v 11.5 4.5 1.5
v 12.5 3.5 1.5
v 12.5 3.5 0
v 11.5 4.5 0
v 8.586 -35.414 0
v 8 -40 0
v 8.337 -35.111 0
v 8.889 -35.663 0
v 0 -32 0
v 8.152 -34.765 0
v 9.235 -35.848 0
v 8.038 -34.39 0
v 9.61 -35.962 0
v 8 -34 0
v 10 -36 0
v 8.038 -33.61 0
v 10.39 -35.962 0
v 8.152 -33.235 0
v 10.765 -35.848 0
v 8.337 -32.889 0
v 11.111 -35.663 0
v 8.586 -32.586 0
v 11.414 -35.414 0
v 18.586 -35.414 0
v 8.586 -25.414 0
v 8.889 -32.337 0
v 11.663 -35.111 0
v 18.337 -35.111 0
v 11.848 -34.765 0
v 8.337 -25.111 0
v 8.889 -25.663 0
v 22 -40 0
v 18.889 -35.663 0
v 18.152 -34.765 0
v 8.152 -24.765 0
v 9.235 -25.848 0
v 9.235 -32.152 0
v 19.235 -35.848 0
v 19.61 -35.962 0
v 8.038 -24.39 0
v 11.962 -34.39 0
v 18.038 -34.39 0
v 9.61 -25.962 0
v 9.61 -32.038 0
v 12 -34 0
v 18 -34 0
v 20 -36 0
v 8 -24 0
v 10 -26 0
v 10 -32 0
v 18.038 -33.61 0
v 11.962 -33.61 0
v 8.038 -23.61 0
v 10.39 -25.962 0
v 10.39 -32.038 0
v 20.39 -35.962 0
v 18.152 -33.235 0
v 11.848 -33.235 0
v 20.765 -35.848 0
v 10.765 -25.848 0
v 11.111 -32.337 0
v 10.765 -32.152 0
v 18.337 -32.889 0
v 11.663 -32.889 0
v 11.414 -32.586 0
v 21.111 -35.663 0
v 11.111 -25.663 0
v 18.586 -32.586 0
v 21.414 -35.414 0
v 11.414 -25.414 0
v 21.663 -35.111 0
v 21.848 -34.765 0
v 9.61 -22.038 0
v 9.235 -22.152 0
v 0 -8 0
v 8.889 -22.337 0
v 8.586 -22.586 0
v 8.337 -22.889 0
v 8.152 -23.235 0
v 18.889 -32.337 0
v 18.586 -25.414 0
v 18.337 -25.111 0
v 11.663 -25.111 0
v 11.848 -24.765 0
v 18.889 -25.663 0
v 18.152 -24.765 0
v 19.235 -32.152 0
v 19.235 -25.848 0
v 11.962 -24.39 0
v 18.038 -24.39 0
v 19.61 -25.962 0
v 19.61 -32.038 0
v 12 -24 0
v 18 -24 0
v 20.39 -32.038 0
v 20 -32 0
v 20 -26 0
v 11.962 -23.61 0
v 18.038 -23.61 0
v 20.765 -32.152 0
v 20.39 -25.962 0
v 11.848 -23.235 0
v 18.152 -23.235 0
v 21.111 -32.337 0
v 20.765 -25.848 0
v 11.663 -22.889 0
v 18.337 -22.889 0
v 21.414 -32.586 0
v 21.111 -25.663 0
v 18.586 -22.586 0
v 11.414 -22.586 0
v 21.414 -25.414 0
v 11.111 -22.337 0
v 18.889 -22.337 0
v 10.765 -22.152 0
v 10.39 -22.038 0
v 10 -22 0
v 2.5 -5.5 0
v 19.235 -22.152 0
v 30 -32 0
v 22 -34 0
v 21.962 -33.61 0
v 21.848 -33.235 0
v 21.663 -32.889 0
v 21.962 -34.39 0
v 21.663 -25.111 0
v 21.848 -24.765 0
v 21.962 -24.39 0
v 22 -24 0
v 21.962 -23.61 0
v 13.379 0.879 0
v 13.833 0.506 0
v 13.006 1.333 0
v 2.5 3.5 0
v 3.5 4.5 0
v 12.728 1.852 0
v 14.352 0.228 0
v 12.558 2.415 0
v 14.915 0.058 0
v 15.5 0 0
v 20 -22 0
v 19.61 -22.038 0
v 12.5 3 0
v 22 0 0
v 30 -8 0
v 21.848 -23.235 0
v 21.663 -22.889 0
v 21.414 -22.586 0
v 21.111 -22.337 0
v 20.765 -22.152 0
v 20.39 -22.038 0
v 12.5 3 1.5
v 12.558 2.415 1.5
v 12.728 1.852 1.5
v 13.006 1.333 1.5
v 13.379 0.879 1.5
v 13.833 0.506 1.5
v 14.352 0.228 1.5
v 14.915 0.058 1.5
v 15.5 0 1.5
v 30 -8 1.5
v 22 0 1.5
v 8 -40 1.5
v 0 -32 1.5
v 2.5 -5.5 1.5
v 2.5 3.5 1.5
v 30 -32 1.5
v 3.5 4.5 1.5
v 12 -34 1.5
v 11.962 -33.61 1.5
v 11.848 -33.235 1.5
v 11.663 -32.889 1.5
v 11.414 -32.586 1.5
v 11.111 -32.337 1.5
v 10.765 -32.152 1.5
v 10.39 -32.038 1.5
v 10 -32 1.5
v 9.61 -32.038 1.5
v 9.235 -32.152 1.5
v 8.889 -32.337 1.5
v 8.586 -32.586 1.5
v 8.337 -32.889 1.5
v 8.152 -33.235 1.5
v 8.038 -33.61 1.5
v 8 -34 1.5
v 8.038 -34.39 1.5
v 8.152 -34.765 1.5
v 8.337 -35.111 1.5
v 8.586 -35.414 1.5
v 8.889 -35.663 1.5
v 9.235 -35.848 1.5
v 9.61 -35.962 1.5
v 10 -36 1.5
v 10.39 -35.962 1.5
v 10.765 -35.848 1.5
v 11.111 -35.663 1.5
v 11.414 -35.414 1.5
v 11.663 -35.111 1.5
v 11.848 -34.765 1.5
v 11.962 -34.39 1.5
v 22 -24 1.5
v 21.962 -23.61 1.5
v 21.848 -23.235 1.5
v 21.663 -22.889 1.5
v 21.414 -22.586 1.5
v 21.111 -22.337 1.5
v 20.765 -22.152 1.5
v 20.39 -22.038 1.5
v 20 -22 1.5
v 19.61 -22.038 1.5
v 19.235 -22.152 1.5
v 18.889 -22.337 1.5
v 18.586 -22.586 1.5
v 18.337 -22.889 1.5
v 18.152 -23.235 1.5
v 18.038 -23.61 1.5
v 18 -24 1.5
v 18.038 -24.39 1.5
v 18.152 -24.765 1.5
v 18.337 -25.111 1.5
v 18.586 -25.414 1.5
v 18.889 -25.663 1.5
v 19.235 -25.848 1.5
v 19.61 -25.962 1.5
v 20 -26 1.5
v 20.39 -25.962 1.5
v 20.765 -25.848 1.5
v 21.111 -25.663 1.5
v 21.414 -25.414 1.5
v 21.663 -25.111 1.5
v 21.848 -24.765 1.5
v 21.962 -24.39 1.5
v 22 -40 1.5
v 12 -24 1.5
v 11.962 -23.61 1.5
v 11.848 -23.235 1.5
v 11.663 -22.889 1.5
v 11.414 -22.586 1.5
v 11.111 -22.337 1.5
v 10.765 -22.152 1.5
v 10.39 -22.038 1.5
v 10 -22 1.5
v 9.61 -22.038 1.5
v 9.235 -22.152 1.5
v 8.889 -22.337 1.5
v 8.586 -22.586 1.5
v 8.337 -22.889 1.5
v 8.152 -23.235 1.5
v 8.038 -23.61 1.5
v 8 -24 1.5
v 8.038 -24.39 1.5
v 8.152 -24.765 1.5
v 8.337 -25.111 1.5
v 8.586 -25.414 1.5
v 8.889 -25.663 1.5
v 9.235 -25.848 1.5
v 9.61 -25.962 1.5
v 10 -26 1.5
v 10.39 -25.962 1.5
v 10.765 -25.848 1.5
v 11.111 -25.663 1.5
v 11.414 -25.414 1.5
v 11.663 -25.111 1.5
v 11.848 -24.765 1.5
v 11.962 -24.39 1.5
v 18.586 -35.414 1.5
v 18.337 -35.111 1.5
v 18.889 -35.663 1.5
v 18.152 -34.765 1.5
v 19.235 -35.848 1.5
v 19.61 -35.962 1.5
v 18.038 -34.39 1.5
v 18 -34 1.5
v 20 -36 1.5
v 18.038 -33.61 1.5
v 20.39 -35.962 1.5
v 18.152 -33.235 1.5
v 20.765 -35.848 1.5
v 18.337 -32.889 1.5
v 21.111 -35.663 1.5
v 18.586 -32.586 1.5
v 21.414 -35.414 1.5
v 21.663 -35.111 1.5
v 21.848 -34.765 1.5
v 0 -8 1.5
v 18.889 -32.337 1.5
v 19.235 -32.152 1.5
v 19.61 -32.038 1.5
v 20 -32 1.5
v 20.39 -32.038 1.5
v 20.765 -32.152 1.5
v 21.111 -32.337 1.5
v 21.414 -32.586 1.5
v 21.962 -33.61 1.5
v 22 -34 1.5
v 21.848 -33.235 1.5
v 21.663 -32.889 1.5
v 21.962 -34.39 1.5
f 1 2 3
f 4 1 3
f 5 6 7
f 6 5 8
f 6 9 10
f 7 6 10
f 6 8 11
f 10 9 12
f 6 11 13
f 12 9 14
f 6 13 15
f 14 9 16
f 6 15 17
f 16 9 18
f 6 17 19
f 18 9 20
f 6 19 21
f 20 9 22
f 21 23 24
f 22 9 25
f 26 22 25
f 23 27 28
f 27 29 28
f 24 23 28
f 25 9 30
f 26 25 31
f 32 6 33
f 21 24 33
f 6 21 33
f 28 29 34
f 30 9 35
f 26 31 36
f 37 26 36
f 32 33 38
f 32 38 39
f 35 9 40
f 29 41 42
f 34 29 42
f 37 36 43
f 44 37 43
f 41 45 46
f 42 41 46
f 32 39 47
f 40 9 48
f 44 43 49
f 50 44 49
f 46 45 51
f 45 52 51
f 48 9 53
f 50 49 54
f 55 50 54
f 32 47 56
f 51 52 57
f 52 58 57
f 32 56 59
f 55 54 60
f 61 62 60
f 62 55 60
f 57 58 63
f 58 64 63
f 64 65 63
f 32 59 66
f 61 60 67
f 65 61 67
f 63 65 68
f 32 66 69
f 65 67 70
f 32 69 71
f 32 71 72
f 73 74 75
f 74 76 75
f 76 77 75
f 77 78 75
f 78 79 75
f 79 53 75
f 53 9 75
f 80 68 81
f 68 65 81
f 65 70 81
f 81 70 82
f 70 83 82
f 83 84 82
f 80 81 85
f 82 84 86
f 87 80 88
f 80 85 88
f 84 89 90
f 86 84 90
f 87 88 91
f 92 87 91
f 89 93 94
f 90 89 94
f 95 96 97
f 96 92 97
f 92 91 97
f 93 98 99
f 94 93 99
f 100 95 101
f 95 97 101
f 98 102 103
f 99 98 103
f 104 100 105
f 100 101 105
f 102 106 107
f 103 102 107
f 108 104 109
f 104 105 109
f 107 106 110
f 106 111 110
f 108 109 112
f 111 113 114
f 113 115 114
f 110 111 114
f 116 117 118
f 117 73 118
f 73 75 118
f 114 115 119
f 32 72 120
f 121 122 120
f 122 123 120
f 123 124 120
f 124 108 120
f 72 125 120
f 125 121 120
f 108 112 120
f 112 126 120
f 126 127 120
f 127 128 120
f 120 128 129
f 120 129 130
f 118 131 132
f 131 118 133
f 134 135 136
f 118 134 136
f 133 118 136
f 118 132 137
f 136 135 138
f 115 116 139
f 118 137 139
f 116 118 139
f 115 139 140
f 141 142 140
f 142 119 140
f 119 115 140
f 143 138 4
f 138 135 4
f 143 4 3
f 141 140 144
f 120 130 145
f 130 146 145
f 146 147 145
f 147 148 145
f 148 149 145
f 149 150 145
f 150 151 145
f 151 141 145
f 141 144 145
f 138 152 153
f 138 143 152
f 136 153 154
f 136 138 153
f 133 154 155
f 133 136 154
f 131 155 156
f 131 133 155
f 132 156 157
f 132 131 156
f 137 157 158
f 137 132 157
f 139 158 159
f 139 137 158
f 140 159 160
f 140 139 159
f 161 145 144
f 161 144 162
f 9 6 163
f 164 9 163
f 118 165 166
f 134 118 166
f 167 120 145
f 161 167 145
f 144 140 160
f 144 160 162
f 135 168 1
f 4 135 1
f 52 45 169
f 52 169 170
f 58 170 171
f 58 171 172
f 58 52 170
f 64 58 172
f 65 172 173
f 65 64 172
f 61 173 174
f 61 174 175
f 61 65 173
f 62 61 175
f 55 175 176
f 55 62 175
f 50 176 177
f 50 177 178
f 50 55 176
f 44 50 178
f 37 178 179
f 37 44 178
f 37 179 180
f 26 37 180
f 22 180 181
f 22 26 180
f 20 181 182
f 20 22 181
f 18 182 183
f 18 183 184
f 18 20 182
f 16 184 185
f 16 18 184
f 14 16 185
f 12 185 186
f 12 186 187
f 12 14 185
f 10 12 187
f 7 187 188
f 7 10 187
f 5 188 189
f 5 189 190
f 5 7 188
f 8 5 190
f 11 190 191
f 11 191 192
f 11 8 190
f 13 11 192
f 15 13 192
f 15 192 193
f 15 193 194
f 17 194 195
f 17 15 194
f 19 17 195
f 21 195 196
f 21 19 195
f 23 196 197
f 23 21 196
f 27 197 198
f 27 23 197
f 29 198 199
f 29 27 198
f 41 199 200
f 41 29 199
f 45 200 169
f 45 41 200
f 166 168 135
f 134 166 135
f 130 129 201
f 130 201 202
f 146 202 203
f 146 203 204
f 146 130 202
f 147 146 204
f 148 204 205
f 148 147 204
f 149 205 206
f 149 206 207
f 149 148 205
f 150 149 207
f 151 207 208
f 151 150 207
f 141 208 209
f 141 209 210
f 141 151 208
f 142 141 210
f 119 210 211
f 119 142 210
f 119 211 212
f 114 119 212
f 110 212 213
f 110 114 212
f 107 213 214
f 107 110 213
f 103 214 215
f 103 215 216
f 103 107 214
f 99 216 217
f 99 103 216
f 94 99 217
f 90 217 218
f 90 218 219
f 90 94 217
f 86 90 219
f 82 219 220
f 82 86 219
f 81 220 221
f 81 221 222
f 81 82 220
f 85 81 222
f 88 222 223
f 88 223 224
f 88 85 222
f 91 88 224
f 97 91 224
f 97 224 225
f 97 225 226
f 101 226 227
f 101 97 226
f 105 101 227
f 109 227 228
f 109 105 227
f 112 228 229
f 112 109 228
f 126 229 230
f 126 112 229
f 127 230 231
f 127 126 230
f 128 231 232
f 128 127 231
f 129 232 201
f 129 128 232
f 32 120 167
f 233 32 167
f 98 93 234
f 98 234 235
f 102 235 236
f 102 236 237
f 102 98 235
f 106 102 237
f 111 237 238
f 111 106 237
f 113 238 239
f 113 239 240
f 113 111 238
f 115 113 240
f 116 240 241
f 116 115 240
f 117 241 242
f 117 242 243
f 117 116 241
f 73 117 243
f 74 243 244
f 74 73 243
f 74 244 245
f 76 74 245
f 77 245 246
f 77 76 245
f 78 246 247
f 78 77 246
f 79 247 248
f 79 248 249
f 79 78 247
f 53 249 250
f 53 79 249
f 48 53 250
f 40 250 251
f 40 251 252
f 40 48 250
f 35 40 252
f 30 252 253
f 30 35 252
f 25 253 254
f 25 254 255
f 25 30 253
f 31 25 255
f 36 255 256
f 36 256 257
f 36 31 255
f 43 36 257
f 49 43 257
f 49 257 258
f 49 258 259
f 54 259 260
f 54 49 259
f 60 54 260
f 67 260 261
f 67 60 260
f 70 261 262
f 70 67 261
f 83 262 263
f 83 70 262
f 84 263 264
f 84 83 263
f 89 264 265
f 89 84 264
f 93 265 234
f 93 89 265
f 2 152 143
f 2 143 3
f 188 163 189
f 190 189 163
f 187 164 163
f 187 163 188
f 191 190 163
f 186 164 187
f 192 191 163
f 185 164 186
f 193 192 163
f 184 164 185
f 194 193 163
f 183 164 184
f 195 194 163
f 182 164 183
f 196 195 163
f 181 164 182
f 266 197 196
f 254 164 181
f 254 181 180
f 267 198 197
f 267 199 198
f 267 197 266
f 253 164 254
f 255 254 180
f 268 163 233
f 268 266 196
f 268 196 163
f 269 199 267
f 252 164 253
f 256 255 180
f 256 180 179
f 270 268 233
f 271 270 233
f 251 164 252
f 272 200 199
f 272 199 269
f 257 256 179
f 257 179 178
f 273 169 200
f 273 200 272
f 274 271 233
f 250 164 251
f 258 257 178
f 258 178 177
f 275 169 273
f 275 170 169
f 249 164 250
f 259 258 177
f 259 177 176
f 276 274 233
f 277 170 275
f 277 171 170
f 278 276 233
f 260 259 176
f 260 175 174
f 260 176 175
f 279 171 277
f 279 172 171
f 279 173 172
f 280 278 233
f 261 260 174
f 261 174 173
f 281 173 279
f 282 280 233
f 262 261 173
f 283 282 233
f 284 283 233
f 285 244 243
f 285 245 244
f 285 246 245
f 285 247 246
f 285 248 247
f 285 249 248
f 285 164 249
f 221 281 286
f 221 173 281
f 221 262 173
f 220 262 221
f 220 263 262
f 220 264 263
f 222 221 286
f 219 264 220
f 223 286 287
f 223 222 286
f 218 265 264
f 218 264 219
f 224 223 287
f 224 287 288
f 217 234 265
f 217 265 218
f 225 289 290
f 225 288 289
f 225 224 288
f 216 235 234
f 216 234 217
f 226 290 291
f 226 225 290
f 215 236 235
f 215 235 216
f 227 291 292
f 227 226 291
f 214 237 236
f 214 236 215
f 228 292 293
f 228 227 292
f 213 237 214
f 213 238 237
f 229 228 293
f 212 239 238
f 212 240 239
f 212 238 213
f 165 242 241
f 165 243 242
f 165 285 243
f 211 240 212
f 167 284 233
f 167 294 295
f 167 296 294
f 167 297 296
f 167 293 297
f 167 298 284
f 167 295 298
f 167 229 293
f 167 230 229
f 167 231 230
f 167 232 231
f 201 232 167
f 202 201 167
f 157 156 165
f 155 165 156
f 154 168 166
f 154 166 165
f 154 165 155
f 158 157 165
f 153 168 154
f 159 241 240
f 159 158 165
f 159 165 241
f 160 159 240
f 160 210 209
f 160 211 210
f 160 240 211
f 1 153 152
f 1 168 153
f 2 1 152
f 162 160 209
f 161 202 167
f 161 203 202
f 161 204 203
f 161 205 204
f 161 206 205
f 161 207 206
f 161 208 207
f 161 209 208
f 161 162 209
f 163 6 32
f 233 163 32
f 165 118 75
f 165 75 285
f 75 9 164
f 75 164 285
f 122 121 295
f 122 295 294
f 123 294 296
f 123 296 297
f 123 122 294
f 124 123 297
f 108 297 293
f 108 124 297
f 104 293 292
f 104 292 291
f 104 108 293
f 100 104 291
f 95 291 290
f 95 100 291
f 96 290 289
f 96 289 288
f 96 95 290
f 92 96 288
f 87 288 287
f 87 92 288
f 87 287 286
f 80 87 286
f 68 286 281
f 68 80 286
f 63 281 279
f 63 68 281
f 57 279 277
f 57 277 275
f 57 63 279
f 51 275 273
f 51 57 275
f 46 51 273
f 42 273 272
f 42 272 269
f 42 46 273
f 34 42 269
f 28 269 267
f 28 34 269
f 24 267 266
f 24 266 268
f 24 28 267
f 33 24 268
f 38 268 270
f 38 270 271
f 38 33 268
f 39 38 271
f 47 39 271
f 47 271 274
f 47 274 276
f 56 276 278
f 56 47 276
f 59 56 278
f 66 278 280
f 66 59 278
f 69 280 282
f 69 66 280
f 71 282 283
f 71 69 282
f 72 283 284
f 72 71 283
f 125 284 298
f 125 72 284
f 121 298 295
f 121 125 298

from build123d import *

# Parameters (mm, degrees)
SKETCH1_W           = 30
SKETCH1_H           = 40
SKETCH1_R           = 2
BOSS_EXTRUDE1_DEPTH = 1.5
CHAMFER1_SIZE       = 8
SKETCH2_W           = 10
SKETCH2_H           = 10
BOSS_EXTRUDE2_DEPTH = 1.5
CHAMFER3_SIZE       = 1
FILLET1_R           = 3


with BuildPart() as part:
    # Sketch1 → Boss-Extrude1 (new body)
    with BuildSketch(Plane.XY):
        with Locations((15, -20)):
            Rectangle(SKETCH1_W, SKETCH1_H)
        with Locations((20, -34)):
            Circle(SKETCH1_R, mode=Mode.SUBTRACT)
        with Locations((10, -34)):
            Circle(SKETCH1_R, mode=Mode.SUBTRACT)
        with Locations((20, -24)):
            Circle(SKETCH1_R, mode=Mode.SUBTRACT)
        with Locations((10, -24)):
            Circle(SKETCH1_R, mode=Mode.SUBTRACT)
    extrude(amount=BOSS_EXTRUDE1_DEPTH)

    # Chamfer1
    chamfer1_edges = [part.edges().sort_by_distance(p)[0] for p in [
        (0, 0, 0.75),
        (30, 0, 0.75),
        (30, -40, 0.75),
        (0, -40, 0.75),
    ]]
    chamfer(chamfer1_edges, length=CHAMFER1_SIZE)

    # Sketch2 → Boss-Extrude2 (add)
    with BuildSketch(Plane.XY.offset(1.5)):
        with Locations((7.5, -0.5)):
            Rectangle(SKETCH2_W, SKETCH2_H)
    extrude(amount=-BOSS_EXTRUDE2_DEPTH)

    # Chamfer3
    chamfer3_edges = [part.edges().sort_by_distance(p)[0] for p in [
        (12.5, 4.5, 0.75),
        (2.5, 4.5, 0.75),
    ]]
    chamfer(chamfer3_edges, length=CHAMFER3_SIZE)

    # Fillet1
    fillet1_edges = [part.edges().sort_by_distance(p)[0] for p in [
        (12.5, 0, 0.75),
    ]]
    fillet(fillet1_edges, radius=FILLET1_R)


solid = part.part
